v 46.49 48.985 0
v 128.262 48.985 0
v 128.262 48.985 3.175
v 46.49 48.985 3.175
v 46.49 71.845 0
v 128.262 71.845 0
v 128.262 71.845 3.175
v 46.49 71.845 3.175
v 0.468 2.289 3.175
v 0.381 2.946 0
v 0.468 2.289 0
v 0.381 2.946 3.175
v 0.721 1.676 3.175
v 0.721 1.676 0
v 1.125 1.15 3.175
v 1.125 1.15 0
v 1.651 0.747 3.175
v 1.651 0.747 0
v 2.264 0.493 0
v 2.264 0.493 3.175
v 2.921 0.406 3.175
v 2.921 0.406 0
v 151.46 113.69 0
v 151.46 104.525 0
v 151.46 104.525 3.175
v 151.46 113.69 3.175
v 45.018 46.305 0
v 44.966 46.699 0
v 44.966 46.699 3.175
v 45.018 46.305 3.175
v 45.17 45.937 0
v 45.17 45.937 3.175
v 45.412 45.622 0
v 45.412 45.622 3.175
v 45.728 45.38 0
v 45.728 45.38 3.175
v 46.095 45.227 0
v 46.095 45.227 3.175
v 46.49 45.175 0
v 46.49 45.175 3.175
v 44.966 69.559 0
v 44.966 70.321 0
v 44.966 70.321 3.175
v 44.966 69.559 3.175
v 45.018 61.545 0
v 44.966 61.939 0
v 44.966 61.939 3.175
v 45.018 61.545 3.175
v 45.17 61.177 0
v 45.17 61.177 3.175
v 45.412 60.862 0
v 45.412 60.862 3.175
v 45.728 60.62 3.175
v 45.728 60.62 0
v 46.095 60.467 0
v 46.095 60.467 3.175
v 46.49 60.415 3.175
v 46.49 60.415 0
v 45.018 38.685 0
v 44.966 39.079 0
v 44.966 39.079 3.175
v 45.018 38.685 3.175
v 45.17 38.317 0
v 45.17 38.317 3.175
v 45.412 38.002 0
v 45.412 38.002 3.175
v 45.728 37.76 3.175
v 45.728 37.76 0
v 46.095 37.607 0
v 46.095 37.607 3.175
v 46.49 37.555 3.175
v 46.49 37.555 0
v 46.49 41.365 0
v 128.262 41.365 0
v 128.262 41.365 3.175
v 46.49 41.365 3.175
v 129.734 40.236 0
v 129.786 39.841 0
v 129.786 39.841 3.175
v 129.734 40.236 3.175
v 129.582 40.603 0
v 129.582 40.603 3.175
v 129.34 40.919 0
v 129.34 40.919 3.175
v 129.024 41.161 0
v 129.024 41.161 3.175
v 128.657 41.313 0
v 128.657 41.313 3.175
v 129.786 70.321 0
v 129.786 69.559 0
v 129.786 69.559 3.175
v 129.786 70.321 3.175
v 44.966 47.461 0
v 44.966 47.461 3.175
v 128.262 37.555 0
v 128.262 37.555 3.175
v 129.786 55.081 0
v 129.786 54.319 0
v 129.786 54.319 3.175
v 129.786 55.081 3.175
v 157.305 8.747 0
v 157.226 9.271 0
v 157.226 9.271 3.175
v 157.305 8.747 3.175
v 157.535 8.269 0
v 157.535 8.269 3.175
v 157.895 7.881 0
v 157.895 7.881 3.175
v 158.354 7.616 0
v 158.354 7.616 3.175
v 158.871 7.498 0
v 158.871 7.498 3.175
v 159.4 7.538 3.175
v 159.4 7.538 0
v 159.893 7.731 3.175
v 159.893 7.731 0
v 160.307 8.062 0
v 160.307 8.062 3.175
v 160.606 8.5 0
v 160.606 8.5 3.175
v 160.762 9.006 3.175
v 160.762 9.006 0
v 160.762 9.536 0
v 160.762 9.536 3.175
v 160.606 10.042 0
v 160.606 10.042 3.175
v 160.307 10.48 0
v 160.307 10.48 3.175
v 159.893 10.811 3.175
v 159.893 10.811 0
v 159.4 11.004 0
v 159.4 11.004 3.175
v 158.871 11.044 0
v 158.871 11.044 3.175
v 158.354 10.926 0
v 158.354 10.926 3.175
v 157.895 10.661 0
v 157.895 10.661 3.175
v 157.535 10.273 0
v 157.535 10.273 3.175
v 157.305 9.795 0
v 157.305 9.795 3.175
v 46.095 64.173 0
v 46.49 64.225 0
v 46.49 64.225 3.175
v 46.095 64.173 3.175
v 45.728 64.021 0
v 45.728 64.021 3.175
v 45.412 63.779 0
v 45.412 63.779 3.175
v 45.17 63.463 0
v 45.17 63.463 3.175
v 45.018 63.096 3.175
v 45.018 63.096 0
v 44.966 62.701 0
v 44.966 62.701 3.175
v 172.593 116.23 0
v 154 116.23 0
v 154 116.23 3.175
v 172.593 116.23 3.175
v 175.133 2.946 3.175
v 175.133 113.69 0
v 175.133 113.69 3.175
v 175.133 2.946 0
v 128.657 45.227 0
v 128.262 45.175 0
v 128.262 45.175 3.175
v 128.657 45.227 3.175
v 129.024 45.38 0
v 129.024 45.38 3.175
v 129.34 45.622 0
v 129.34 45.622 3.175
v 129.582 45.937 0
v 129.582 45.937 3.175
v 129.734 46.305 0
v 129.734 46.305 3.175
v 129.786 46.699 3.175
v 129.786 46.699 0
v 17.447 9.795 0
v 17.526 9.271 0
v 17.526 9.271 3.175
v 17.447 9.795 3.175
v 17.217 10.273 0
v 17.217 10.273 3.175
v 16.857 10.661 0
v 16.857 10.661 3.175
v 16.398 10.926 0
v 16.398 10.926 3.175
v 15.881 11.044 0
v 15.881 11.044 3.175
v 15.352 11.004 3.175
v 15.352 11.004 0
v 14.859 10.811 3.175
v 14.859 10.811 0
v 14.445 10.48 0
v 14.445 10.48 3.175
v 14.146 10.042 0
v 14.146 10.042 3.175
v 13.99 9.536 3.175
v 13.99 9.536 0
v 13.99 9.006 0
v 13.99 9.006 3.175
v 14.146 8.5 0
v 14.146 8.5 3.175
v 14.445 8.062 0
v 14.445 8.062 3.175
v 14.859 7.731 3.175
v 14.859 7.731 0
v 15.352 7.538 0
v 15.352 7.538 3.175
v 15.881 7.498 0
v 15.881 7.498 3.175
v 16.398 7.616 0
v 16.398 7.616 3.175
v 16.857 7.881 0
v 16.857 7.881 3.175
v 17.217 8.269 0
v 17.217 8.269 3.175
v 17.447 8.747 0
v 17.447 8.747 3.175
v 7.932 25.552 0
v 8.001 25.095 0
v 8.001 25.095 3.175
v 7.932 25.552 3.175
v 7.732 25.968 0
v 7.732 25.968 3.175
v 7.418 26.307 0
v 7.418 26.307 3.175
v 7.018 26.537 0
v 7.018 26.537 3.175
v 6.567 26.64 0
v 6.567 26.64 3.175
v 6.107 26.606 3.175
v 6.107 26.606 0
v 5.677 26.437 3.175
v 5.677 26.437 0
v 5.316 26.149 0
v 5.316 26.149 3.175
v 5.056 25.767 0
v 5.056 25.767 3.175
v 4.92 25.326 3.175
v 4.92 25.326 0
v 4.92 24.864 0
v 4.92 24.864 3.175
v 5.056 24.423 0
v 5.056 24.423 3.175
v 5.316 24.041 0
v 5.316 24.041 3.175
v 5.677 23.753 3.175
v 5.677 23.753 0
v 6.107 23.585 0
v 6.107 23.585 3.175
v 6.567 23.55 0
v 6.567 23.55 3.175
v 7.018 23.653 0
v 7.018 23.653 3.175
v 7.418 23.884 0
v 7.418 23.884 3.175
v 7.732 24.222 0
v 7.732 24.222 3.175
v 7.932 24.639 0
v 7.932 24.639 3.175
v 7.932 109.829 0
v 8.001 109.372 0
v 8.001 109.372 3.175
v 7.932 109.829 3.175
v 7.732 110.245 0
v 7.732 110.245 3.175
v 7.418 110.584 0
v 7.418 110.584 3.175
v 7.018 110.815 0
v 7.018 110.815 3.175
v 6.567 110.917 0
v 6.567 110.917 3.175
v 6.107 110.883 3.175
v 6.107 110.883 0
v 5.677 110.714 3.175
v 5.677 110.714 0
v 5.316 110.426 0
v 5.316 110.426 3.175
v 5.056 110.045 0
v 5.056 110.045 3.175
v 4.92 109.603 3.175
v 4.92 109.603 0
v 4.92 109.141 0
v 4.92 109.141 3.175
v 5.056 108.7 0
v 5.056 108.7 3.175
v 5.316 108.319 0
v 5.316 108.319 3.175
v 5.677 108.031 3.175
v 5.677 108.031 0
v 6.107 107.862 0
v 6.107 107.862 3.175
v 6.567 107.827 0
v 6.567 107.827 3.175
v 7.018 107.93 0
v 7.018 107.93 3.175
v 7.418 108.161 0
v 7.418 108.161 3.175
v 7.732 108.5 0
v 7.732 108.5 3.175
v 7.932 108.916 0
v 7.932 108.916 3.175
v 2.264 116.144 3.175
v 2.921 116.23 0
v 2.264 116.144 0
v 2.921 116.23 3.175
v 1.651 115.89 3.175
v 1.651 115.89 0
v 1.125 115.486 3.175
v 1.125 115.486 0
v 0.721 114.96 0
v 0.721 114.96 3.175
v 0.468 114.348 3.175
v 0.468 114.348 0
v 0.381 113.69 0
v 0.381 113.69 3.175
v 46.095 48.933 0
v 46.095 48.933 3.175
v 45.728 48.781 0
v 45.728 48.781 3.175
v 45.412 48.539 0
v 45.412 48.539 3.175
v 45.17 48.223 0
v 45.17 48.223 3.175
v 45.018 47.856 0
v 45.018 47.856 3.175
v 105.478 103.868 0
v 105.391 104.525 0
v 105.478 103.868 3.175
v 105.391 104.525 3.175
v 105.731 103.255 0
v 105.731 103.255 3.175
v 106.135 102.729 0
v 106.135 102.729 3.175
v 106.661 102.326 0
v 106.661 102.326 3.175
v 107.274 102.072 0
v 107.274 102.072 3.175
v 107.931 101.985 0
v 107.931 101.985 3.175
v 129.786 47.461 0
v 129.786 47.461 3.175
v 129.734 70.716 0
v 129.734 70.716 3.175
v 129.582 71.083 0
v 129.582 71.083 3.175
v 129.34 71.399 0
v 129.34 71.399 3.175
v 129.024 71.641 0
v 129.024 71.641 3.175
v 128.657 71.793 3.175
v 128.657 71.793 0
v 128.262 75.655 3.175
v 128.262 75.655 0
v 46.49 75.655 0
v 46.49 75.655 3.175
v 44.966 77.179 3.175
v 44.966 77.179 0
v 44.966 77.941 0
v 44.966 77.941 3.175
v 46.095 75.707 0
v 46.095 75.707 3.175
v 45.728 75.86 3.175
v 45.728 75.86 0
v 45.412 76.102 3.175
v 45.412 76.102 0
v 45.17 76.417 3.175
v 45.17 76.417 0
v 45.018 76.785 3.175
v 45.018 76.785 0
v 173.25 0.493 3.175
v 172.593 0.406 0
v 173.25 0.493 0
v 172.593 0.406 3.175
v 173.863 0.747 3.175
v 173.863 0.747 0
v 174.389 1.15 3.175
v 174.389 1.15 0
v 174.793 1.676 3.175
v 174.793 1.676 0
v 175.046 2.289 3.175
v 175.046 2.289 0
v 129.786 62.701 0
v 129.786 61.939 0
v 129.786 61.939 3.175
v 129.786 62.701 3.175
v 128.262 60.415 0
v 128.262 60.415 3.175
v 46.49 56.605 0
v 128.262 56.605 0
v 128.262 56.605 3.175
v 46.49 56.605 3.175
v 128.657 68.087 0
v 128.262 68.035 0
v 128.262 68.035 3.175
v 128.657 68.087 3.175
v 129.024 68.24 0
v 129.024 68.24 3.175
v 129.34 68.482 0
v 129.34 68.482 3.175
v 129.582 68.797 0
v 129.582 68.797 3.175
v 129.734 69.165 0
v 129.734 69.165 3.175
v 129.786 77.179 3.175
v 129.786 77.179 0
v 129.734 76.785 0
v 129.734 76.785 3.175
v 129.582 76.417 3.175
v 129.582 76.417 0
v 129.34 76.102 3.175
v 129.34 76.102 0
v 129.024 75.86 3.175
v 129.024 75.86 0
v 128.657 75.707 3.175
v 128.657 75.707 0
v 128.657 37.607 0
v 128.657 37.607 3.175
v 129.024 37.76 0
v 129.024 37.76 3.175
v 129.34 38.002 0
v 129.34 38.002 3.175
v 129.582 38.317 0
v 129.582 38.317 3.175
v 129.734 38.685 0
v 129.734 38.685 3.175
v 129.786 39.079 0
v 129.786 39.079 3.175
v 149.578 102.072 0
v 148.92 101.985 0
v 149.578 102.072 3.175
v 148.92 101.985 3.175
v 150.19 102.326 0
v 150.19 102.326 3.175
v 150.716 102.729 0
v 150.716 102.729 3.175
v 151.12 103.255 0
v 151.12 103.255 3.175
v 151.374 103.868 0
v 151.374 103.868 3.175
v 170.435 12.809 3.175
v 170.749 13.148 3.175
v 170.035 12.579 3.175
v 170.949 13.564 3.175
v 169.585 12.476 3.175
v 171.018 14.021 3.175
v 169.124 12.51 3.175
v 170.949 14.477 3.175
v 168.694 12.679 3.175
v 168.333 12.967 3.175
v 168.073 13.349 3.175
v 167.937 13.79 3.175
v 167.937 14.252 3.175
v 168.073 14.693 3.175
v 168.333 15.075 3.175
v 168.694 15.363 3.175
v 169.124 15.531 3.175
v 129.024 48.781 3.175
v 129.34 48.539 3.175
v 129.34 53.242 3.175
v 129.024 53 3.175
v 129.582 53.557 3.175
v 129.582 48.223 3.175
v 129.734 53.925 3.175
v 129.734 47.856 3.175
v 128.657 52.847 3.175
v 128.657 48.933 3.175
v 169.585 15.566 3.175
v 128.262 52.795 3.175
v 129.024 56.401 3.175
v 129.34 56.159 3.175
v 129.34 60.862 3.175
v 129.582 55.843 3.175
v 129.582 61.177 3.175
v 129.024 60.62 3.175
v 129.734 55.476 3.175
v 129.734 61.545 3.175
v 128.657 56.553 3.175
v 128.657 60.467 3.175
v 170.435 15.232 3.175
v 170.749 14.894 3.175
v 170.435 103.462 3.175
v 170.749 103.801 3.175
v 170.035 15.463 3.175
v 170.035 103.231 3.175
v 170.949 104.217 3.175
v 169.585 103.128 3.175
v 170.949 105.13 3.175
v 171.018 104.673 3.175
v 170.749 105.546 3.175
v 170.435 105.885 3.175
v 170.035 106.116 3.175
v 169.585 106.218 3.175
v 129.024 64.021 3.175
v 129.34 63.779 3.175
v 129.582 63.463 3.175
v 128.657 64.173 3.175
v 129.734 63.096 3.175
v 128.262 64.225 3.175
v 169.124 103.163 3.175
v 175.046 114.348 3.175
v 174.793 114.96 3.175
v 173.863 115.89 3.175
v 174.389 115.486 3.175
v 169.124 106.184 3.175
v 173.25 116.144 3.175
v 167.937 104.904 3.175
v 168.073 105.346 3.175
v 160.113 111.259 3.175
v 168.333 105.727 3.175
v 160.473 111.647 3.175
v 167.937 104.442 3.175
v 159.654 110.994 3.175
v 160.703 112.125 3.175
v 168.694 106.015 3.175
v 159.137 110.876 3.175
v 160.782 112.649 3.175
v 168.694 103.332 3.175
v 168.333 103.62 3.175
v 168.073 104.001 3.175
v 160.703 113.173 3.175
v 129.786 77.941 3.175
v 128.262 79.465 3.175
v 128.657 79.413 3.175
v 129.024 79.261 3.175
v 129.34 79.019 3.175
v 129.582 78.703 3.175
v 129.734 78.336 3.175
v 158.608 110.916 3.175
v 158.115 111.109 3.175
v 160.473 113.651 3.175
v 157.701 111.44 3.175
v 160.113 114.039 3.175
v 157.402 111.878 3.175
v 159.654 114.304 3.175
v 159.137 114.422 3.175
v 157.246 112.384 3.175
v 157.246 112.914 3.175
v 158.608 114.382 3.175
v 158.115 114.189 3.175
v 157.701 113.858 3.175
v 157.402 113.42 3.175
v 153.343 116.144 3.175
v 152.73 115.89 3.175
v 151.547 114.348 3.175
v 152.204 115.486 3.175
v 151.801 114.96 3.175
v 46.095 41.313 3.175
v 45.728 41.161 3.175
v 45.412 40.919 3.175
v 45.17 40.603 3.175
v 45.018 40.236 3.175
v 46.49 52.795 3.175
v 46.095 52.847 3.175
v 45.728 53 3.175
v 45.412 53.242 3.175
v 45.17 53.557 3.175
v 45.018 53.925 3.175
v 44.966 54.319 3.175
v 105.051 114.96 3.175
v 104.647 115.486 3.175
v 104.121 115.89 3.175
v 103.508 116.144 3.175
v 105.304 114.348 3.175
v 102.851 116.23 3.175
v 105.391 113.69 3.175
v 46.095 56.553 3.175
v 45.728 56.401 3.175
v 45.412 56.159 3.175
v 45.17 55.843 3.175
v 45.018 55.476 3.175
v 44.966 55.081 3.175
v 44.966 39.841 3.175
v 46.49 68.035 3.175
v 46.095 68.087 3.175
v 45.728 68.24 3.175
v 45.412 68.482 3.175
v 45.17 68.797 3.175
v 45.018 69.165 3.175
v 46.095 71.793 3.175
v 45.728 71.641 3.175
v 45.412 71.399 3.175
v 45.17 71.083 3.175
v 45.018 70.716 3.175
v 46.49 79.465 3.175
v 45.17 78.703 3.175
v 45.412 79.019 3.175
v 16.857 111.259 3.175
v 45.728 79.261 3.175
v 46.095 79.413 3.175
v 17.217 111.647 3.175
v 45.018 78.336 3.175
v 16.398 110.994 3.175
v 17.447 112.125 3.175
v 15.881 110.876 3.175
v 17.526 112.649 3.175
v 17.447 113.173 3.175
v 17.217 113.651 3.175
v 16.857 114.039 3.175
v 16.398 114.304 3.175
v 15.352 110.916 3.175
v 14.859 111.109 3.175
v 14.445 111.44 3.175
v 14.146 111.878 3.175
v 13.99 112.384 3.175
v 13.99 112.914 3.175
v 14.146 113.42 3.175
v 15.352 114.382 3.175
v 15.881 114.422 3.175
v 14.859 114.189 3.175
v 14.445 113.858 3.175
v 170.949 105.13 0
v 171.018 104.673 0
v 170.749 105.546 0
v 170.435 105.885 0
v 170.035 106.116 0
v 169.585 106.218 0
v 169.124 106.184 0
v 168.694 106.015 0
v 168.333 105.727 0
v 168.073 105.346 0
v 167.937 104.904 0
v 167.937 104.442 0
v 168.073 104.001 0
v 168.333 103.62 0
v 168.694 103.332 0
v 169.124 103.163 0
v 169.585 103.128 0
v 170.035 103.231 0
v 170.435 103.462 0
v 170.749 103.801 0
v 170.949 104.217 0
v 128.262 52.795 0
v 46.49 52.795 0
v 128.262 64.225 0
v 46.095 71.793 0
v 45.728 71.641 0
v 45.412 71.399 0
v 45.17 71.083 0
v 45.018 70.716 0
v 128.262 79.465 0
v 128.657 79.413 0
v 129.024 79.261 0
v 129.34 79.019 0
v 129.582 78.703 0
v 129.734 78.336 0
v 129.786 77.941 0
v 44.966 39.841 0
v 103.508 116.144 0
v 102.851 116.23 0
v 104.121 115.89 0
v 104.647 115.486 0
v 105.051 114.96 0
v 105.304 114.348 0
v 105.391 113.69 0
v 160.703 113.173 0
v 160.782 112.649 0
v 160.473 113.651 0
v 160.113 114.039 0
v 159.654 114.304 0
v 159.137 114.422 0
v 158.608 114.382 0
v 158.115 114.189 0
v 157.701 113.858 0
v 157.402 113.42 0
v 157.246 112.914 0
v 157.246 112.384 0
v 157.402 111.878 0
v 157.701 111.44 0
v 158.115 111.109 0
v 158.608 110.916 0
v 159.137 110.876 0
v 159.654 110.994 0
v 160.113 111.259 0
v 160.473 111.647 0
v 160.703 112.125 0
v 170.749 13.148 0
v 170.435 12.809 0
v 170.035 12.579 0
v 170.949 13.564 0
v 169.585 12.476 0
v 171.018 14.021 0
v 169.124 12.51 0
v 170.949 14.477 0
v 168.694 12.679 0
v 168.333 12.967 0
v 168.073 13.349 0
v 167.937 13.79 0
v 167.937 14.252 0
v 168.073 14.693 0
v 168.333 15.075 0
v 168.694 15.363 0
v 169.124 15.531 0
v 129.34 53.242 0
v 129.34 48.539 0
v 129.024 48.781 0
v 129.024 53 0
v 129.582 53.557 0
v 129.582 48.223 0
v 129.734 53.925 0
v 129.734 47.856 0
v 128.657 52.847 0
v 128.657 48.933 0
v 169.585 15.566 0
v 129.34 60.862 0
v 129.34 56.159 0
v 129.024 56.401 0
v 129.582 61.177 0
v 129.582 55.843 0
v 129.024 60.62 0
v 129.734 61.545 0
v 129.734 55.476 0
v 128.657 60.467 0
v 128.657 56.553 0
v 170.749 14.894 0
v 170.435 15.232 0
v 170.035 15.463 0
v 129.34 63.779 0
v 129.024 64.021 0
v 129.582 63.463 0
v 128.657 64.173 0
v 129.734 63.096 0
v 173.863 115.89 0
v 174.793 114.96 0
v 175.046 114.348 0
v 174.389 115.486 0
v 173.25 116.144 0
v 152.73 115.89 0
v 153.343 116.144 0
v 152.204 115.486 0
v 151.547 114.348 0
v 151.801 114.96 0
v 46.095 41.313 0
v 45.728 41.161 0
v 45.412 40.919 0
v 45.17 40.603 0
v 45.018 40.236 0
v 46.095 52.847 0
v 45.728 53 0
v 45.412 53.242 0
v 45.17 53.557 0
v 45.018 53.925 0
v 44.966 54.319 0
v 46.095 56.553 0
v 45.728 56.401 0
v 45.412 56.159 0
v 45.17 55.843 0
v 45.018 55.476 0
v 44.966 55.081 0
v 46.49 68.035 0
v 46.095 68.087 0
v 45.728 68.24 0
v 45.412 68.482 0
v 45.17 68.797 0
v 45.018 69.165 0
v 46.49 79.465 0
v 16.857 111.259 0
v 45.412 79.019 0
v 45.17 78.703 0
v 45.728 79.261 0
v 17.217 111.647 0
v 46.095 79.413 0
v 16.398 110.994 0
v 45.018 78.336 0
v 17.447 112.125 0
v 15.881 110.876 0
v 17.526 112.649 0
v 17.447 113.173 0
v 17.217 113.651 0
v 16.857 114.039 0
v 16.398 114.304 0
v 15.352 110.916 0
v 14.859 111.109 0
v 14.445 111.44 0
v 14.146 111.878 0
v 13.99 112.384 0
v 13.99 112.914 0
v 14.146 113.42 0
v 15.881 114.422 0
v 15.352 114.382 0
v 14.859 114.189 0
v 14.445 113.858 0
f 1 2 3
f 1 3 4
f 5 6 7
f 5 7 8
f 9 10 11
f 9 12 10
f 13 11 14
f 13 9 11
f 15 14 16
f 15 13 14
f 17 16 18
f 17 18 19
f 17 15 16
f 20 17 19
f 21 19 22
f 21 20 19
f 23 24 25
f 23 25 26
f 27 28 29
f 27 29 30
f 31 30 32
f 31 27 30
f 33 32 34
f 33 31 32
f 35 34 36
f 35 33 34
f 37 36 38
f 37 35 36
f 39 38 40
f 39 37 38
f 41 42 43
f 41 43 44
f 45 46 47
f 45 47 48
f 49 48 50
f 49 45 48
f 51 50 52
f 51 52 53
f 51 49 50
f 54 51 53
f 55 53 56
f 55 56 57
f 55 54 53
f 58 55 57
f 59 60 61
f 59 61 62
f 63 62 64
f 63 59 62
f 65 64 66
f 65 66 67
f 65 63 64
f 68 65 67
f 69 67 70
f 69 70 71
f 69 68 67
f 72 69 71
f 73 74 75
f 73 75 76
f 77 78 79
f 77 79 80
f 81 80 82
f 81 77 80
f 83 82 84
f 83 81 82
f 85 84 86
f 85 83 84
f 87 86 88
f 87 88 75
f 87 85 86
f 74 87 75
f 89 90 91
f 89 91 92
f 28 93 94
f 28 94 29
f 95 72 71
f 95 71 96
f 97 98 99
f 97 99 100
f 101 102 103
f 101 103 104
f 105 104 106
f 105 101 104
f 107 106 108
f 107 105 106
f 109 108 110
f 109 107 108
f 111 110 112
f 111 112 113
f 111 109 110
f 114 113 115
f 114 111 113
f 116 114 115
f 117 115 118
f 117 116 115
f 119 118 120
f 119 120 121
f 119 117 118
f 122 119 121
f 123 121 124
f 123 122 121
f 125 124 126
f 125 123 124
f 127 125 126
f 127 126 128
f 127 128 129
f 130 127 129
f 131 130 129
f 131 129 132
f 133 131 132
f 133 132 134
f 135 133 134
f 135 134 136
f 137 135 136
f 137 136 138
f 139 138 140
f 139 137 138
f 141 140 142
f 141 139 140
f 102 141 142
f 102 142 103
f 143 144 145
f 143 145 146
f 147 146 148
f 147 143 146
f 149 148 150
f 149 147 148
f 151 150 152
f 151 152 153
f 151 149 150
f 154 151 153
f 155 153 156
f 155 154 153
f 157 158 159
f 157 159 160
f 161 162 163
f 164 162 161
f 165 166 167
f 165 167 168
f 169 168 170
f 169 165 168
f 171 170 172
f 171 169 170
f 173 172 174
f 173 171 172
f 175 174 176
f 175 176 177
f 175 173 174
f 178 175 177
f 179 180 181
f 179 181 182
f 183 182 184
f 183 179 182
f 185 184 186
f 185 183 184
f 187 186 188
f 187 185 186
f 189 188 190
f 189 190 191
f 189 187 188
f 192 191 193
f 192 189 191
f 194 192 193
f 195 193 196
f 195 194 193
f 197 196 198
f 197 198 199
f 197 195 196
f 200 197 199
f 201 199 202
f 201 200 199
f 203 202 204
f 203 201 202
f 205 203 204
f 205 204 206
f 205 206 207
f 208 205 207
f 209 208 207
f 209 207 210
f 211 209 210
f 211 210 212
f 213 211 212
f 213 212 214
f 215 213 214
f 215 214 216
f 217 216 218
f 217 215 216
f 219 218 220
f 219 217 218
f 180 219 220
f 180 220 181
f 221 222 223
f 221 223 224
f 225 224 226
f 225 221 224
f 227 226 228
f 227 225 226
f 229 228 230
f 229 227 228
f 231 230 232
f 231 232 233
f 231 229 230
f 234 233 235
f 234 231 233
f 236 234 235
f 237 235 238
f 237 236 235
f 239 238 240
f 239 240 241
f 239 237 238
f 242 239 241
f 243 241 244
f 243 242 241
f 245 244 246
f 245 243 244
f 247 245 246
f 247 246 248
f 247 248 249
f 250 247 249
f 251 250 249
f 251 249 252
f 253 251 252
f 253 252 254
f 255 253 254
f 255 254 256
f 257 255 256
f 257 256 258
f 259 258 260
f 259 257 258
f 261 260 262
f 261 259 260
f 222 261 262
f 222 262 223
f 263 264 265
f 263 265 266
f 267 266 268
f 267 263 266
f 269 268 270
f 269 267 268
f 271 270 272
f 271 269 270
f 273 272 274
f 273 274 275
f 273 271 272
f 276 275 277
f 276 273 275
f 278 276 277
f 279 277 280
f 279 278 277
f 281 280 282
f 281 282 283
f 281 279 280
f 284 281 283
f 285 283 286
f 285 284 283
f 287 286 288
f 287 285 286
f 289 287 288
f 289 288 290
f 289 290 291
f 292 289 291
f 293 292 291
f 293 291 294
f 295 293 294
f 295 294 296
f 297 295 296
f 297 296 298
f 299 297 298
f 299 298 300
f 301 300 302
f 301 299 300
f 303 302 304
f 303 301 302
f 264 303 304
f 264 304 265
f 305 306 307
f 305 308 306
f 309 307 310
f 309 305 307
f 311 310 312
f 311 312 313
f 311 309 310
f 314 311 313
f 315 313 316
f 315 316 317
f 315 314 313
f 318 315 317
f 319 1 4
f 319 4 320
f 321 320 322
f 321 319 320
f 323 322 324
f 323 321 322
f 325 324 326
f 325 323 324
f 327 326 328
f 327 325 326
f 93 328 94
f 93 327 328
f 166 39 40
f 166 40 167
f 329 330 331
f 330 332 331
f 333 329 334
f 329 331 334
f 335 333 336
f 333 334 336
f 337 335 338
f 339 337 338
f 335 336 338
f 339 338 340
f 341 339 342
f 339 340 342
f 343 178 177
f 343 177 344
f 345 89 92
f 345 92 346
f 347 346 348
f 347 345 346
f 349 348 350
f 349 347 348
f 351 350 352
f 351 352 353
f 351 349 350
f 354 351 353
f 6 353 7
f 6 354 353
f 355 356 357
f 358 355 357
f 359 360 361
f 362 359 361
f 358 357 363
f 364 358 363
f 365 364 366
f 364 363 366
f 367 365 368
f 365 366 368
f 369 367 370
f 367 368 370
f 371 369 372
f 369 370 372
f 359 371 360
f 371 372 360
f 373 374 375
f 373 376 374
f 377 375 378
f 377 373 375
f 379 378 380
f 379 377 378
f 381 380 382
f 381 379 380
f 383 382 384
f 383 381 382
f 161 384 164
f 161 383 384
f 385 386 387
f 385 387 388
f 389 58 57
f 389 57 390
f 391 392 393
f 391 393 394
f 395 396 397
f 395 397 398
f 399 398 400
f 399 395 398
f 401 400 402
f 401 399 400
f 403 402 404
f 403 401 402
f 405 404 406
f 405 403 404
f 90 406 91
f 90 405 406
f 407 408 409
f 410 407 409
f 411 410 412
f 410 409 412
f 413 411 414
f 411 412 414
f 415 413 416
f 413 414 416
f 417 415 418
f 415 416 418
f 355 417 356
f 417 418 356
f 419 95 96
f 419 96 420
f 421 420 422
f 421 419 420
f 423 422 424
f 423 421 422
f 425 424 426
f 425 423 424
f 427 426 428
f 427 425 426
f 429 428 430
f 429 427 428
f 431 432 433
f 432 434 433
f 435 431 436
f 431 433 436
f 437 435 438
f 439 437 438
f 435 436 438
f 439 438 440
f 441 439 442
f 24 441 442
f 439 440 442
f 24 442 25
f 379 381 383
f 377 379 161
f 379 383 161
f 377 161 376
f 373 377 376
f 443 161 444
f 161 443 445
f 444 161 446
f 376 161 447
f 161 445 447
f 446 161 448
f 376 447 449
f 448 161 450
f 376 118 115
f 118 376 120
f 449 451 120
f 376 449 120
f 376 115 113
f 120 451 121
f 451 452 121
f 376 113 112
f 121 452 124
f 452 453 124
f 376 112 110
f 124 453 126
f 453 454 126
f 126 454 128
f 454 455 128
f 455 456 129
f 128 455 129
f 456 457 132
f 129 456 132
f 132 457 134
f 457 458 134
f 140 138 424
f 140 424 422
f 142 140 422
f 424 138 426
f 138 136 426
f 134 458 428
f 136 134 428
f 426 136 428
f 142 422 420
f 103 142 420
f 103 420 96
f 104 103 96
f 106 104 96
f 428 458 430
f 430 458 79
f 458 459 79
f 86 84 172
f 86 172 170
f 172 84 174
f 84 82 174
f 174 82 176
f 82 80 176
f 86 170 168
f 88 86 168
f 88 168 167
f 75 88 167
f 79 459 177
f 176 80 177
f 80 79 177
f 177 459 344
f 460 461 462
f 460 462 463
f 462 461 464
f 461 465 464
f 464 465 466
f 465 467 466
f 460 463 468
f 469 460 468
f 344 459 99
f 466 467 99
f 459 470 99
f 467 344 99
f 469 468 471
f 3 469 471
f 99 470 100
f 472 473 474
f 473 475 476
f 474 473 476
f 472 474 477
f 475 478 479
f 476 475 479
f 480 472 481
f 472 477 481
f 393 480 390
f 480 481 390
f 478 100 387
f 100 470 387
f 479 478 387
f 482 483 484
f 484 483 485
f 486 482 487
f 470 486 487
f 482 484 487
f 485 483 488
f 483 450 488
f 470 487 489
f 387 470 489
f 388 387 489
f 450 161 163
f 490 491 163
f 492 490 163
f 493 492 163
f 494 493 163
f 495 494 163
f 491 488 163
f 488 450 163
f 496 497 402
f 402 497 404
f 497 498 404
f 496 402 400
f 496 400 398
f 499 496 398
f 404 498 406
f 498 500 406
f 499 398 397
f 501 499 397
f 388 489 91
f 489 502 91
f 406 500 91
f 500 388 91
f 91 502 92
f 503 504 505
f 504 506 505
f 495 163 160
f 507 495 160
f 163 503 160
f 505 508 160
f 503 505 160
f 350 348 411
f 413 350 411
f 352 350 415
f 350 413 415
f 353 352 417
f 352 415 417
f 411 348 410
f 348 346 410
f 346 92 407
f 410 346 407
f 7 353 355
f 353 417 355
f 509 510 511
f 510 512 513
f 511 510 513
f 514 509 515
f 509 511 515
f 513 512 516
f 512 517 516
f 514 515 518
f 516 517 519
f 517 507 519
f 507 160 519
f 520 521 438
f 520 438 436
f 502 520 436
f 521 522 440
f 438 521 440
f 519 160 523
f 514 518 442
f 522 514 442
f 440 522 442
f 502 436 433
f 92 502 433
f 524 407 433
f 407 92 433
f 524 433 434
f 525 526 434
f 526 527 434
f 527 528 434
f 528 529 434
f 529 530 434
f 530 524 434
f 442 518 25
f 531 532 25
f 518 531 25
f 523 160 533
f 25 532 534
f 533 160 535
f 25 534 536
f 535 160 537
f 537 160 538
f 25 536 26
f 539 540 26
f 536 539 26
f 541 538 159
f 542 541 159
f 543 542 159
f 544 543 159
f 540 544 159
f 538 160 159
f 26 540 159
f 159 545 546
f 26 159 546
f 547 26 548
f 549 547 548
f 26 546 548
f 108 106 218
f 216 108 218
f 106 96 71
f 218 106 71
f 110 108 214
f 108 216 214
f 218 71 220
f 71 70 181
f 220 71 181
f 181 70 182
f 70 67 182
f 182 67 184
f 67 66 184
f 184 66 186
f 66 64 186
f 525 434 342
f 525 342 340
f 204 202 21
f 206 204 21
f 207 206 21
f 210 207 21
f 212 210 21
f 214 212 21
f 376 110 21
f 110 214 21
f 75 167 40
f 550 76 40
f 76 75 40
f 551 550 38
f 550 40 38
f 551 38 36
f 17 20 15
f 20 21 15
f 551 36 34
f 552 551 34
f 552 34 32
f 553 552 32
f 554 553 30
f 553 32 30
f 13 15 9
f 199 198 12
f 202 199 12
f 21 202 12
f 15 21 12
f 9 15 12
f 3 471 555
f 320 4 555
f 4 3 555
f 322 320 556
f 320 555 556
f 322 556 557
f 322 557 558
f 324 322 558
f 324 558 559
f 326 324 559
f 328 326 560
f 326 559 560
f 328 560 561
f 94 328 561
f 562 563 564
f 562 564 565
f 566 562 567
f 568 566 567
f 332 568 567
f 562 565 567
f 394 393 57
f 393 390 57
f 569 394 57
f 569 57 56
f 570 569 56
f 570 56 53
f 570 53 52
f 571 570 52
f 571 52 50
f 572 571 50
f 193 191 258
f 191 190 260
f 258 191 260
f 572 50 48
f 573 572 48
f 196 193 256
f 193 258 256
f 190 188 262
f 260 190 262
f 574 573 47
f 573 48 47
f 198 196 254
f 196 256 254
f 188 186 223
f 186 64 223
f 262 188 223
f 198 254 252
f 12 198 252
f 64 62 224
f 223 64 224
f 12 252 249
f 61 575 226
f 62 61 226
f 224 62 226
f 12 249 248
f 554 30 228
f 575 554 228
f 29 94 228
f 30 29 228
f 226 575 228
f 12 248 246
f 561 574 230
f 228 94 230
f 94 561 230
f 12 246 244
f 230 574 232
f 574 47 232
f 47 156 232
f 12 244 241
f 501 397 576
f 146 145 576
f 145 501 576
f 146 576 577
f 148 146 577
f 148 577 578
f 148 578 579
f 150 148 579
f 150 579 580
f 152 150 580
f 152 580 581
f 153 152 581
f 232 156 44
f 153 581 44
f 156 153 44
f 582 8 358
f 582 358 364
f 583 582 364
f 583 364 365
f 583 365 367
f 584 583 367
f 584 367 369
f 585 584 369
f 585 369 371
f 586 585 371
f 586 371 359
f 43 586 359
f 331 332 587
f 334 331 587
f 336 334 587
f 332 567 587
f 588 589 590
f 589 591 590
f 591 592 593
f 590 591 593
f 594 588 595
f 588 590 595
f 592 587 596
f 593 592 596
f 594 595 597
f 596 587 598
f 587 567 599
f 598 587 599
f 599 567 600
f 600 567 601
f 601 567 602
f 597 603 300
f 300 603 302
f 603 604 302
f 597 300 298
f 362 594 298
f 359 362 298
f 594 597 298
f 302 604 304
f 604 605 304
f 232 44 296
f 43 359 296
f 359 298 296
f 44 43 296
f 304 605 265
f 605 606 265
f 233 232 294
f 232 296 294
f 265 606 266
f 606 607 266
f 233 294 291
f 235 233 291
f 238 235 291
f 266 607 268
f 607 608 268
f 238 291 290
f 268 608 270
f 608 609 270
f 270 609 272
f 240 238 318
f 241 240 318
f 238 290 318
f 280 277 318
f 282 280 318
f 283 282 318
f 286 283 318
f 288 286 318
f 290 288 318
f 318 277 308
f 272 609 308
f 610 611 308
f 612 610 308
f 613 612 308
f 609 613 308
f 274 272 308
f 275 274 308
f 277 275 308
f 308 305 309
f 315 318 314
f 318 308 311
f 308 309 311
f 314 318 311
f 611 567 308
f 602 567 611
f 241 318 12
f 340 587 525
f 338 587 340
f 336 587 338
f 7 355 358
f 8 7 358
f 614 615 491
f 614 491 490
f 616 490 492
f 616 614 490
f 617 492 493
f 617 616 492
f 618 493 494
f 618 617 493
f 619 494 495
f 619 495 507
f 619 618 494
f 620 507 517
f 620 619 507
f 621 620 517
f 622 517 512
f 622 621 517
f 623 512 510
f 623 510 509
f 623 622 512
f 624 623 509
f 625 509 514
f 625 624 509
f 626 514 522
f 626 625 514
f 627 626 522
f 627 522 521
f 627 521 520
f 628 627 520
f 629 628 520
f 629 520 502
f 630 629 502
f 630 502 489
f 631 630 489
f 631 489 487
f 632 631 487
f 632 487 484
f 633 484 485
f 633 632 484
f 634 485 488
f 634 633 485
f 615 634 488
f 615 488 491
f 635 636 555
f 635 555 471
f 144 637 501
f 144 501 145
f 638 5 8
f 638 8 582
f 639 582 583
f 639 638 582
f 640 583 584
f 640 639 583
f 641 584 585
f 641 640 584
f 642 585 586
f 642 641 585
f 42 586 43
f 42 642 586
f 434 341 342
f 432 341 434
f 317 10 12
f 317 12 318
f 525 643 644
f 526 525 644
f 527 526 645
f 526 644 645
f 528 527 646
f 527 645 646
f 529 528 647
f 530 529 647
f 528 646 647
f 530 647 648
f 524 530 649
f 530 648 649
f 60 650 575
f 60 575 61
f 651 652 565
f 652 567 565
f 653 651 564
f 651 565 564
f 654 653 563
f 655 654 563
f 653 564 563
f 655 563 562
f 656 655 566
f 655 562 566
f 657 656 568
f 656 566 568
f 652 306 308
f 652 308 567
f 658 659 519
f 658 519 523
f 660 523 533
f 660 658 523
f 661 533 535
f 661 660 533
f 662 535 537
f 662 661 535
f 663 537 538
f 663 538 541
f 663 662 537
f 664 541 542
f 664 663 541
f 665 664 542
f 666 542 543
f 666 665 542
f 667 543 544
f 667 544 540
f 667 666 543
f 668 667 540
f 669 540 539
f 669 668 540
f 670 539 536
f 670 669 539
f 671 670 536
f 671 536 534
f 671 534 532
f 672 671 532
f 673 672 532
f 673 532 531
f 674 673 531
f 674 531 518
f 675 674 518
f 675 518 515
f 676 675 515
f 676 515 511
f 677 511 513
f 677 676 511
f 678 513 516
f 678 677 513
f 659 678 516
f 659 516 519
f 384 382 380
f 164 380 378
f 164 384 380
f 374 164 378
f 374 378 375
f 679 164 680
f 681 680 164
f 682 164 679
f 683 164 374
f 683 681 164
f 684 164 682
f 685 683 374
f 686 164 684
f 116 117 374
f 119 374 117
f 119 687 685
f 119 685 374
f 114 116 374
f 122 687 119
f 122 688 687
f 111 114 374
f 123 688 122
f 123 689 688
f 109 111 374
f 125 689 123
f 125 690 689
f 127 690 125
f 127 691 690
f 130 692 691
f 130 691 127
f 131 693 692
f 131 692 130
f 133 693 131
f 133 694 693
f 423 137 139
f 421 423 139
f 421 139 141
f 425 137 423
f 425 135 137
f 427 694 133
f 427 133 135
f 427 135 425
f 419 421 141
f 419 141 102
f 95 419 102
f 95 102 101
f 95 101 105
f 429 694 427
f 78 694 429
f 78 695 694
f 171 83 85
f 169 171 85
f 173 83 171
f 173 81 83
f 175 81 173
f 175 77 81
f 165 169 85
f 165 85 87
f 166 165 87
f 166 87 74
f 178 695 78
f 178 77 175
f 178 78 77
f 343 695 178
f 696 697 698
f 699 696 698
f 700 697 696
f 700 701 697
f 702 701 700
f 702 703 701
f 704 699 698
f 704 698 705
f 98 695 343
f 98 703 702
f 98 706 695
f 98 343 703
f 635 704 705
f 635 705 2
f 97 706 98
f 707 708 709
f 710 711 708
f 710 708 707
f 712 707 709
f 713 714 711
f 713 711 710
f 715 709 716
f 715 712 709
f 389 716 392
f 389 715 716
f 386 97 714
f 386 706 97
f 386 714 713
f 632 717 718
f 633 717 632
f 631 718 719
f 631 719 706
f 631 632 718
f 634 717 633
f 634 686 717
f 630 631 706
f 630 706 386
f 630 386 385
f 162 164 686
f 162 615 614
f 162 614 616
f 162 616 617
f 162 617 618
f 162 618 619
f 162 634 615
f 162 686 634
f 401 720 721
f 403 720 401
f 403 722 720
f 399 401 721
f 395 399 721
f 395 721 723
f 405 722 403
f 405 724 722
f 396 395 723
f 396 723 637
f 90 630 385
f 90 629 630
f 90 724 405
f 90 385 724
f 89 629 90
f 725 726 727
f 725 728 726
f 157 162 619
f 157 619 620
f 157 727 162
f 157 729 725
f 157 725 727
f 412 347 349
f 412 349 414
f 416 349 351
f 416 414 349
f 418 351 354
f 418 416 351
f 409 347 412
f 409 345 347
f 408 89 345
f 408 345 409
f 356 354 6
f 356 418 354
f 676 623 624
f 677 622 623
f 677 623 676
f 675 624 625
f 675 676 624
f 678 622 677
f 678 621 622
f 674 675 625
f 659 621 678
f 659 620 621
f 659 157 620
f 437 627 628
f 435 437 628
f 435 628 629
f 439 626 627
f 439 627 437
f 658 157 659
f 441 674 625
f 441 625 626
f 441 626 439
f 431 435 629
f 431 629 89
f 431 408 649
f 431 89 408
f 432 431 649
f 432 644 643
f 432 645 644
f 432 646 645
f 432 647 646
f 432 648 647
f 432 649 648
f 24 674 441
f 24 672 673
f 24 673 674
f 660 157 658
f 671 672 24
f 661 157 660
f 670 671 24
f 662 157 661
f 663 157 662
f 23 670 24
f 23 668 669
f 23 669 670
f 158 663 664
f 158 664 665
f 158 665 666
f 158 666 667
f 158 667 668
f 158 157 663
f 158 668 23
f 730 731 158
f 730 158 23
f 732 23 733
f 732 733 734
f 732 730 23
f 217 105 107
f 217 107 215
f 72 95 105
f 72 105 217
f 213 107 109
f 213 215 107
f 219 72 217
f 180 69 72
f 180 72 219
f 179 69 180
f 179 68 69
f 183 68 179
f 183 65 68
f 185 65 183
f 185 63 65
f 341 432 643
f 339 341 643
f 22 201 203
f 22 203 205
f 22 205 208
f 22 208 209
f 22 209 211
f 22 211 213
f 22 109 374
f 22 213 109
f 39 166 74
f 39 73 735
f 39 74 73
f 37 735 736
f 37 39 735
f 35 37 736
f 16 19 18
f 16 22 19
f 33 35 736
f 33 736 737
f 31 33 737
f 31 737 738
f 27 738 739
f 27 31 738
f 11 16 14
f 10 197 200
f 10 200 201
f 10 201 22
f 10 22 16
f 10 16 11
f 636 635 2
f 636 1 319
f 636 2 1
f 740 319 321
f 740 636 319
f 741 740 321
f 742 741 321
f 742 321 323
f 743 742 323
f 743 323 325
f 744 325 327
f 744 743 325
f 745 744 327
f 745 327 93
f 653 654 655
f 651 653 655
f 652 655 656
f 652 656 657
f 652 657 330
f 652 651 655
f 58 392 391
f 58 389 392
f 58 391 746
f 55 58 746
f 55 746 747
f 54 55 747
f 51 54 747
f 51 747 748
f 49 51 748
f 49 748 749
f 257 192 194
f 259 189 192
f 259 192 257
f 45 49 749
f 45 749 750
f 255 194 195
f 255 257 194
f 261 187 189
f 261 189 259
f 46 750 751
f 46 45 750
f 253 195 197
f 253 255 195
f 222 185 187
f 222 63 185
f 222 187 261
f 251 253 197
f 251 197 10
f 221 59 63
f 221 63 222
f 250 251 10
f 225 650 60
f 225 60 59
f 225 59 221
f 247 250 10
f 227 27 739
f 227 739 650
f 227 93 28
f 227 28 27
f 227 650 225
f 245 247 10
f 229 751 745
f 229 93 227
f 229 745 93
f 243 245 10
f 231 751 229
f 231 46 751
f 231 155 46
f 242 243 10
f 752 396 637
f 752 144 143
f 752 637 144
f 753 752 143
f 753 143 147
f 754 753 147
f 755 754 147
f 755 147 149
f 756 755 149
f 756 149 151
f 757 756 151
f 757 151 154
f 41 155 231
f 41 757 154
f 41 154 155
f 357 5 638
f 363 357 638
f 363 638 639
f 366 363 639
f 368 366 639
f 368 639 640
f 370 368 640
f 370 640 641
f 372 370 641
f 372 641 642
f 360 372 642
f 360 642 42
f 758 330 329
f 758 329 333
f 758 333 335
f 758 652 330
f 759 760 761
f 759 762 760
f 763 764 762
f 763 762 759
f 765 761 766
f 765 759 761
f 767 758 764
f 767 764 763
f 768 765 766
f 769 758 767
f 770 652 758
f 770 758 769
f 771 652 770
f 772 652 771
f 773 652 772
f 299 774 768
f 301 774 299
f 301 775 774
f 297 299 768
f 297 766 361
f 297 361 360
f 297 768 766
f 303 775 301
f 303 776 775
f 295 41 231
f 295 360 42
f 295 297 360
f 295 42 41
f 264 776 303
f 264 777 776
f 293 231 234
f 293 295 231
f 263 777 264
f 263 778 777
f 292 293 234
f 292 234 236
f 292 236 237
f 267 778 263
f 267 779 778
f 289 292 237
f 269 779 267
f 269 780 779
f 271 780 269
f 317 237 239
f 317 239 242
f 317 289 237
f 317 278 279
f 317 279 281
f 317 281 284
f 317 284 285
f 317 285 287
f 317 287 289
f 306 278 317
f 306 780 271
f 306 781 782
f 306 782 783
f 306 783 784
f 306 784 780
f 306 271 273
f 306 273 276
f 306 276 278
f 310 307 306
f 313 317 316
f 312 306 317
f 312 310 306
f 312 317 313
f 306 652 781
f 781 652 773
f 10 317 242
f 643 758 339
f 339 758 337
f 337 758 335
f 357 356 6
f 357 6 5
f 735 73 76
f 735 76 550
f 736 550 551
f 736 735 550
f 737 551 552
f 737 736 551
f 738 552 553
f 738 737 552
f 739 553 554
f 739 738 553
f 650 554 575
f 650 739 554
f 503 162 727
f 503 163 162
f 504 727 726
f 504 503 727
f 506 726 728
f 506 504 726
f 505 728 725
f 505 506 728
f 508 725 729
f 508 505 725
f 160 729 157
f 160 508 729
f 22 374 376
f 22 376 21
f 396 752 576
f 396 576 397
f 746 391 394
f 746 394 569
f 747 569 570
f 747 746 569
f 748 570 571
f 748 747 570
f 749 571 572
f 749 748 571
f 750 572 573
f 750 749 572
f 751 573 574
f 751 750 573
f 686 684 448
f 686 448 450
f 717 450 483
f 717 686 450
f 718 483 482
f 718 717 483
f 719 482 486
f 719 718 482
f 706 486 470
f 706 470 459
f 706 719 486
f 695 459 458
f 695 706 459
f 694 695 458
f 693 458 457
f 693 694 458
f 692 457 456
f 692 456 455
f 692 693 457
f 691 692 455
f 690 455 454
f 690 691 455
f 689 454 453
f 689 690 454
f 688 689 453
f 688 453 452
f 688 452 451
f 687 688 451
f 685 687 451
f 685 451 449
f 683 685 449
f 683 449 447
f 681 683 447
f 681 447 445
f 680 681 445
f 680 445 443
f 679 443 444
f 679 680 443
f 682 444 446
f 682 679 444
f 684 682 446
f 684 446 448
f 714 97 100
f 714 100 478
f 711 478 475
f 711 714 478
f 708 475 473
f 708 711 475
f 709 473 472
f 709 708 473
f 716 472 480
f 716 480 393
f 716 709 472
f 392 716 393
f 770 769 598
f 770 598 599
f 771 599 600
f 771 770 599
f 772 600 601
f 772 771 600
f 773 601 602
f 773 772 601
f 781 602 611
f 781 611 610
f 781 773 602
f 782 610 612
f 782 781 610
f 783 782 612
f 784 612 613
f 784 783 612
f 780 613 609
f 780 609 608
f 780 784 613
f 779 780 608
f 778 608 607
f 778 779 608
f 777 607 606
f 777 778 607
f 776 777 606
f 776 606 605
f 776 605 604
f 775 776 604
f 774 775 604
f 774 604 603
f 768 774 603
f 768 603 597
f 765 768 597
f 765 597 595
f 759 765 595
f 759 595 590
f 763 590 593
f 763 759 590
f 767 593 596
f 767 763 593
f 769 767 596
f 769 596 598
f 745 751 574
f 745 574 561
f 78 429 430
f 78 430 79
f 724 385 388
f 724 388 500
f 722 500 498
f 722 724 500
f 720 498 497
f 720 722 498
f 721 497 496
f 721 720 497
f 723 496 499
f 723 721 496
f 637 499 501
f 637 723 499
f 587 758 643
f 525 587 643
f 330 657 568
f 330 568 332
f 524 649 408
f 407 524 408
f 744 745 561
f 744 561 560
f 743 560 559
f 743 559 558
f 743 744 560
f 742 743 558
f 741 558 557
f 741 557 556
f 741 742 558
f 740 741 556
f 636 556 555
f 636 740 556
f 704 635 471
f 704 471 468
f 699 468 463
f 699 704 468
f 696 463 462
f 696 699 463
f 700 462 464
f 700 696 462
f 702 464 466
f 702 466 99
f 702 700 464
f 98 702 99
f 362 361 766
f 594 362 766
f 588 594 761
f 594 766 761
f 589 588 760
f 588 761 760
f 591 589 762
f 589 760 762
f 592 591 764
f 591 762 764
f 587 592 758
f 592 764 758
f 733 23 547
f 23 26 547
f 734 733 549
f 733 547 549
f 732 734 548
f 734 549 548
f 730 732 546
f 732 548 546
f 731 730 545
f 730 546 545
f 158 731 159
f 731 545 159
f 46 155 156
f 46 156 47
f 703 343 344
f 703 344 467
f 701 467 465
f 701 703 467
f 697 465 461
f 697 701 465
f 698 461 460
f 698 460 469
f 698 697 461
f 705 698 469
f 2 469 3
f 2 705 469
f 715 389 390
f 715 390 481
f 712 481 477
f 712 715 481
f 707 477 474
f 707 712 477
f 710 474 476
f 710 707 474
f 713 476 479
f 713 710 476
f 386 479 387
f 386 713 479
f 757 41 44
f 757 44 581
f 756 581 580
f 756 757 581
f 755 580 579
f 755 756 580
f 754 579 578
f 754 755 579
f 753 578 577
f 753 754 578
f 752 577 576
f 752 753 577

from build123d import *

# Parameters (mm, degrees)
SKETCH1_R           = 1.5494
SKETCH1_R_2         = 1.778
BOSS_EXTRUDE1_DEPTH = 3.175
FILLET2_R           = 2.54
FILLET3_R           = 2.54


with BuildPart() as part:
    # Sketch1 → Boss-Extrude1 (new body)
    with BuildSketch(Plane.XY):
        Polygon((0.381, 116.2304), (105.391042757, 116.2304), (105.391042757, 101.985486737), (151.460414906, 101.985486737), (151.460414906, 116.2304), (175.133, 116.2304), (175.133, 0.4064), (0.381, 0.4064), align=None)
        with Locations((6.4516, 109.3724)):
            Circle(SKETCH1_R, mode=Mode.SUBTRACT)
        with Locations((169.4688, 104.6734)):
            Circle(SKETCH1_R, mode=Mode.SUBTRACT)
        with Locations((169.4688, 14.0208)):
            Circle(SKETCH1_R, mode=Mode.SUBTRACT)
        with Locations((6.4516, 25.0952)):
            Circle(SKETCH1_R, mode=Mode.SUBTRACT)
        with Locations((15.748, 112.649)):
            Circle(SKETCH1_R_2, mode=Mode.SUBTRACT)
        with Locations((159.004, 112.649)):
            Circle(SKETCH1_R_2, mode=Mode.SUBTRACT)
        with Locations((15.748, 9.271)):
            Circle(SKETCH1_R_2, mode=Mode.SUBTRACT)
        with Locations(Location((159.004, 9.271, 0), (0, 0, 180))):
            Circle(SKETCH1_R_2, mode=Mode.SUBTRACT)
        with BuildLine():
            Line((44.96589092, 70.321337511), (44.96589092, 69.559337511))
            ThreePointArc((44.96589092, 69.559337511), (45.412260185, 68.481706777), (46.48989092, 68.035337511))
            Line((46.48989092, 68.035337511), (128.26210908, 68.035337511))
            ThreePointArc((128.26210908, 68.035337511), (129.339739815, 68.481706777), (129.78610908, 69.559337511))
            Line((129.78610908, 69.559337511), (129.78610908, 70.321337511))
            ThreePointArc((129.78610908, 70.321337511), (129.339739815, 71.398968246), (128.26210908, 71.845337511))
            Line((128.26210908, 71.845337511), (46.48989092, 71.845337511))
            ThreePointArc((46.48989092, 71.845337511), (45.412260185, 71.398968246), (44.96589092, 70.321337511))
        make_face(mode=Mode.SUBTRACT)
        with BuildLine():
            Line((46.48989092, 79.465337511), (128.26210908, 79.465337511))
            ThreePointArc((128.26210908, 79.465337511), (129.339739815, 79.018968246), (129.78610908, 77.941337511))
            Line((129.78610908, 77.941337511), (129.78610908, 77.179337511))
            ThreePointArc((129.78610908, 77.179337511), (129.339739815, 76.101706777), (128.26210908, 75.655337511))
            Line((128.26210908, 75.655337511), (46.48989092, 75.655337511))
            ThreePointArc((46.48989092, 75.655337511), (45.412260185, 76.101706777), (44.96589092, 77.179337511))
            Line((44.96589092, 77.179337511), (44.96589092, 77.941337511))
            ThreePointArc((44.96589092, 77.941337511), (45.412260185, 79.018968246), (46.48989092, 79.465337511))
        make_face(mode=Mode.SUBTRACT)
        with BuildLine():
            Line((44.96589092, 62.701337511), (44.96589092, 61.939337511))
            ThreePointArc((44.96589092, 61.939337511), (45.412260185, 60.861706777), (46.48989092, 60.415337511))
            Line((46.48989092, 60.415337511), (128.26210908, 60.415337511))
            ThreePointArc((128.26210908, 60.415337511), (129.339739815, 60.861706777), (129.78610908, 61.939337511))
            Line((129.78610908, 61.939337511), (129.78610908, 62.701337511))
            ThreePointArc((129.78610908, 62.701337511), (129.339739815, 63.778968246), (128.26210908, 64.225337511))
            Line((128.26210908, 64.225337511), (46.48989092, 64.225337511))
            ThreePointArc((46.48989092, 64.225337511), (45.412260185, 63.778968246), (44.96589092, 62.701337511))
        make_face(mode=Mode.SUBTRACT)
        with BuildLine():
            Line((44.96589092, 55.081337511), (44.96589092, 54.319337511))
            ThreePointArc((44.96589092, 54.319337511), (45.412260185, 53.241706777), (46.48989092, 52.795337511))
            Line((46.48989092, 52.795337511), (128.26210908, 52.795337511))
            ThreePointArc((128.26210908, 52.795337511), (129.339739815, 53.241706777), (129.78610908, 54.319337511))
            Line((129.78610908, 54.319337511), (129.78610908, 55.081337511))
            ThreePointArc((129.78610908, 55.081337511), (129.339739815, 56.158968246), (128.26210908, 56.605337511))
            Line((128.26210908, 56.605337511), (46.48989092, 56.605337511))
            ThreePointArc((46.48989092, 56.605337511), (45.412260185, 56.158968246), (44.96589092, 55.081337511))
        make_face(mode=Mode.SUBTRACT)
        with BuildLine():
            Line((44.96589092, 47.461337511), (44.96589092, 46.699337511))
            ThreePointArc((44.96589092, 46.699337511), (45.412260185, 45.621706777), (46.48989092, 45.175337511))
            Line((46.48989092, 45.175337511), (128.26210908, 45.175337511))
            ThreePointArc((128.26210908, 45.175337511), (129.339739815, 45.621706777), (129.78610908, 46.699337511))
            Line((129.78610908, 46.699337511), (129.78610908, 47.461337511))
            ThreePointArc((129.78610908, 47.461337511), (129.339739815, 48.538968246), (128.26210908, 48.985337511))
            Line((128.26210908, 48.985337511), (46.48989092, 48.985337511))
            ThreePointArc((46.48989092, 48.985337511), (45.412260185, 48.538968246), (44.96589092, 47.461337511))
        make_face(mode=Mode.SUBTRACT)
        with BuildLine():
            Line((44.96589092, 39.841337511), (44.96589092, 39.079337511))
            ThreePointArc((44.96589092, 39.079337511), (45.412260185, 38.001706777), (46.48989092, 37.555337511))
            Line((46.48989092, 37.555337511), (128.26210908, 37.555337511))
            ThreePointArc((128.26210908, 37.555337511), (129.339739815, 38.001706777), (129.78610908, 39.079337511))
            Line((129.78610908, 39.079337511), (129.78610908, 39.841337511))
            ThreePointArc((129.78610908, 39.841337511), (129.339739815, 40.918968246), (128.26210908, 41.365337511))
            Line((128.26210908, 41.365337511), (46.48989092, 41.365337511))
            ThreePointArc((46.48989092, 41.365337511), (45.412260185, 40.918968246), (44.96589092, 39.841337511))
        make_face(mode=Mode.SUBTRACT)
    extrude(amount=BOSS_EXTRUDE1_DEPTH)

    # Fillet2
    fillet2_edges = [part.edges().sort_by_distance(p)[0] for p in [
        (105.391042757, 116.2304, 1.5875),
        (105.391042757, 101.985486737, 1.5875),
        (151.460414906, 101.985486737, 1.5875),
        (151.460414906, 116.2304, 1.5875),
    ]]
    fillet(fillet2_edges, radius=FILLET2_R)

    # Fillet3
    fillet3_edges = [part.edges().sort_by_distance(p)[0] for p in [
        (0.381, 116.2304, 1.5875),
        (175.133, 116.2304, 1.5875),
        (175.133, 0.4064, 1.5875),
        (0.381, 0.4064, 1.5875),
    ]]
    fillet(fillet3_edges, radius=FILLET3_R)


solid = part.part
